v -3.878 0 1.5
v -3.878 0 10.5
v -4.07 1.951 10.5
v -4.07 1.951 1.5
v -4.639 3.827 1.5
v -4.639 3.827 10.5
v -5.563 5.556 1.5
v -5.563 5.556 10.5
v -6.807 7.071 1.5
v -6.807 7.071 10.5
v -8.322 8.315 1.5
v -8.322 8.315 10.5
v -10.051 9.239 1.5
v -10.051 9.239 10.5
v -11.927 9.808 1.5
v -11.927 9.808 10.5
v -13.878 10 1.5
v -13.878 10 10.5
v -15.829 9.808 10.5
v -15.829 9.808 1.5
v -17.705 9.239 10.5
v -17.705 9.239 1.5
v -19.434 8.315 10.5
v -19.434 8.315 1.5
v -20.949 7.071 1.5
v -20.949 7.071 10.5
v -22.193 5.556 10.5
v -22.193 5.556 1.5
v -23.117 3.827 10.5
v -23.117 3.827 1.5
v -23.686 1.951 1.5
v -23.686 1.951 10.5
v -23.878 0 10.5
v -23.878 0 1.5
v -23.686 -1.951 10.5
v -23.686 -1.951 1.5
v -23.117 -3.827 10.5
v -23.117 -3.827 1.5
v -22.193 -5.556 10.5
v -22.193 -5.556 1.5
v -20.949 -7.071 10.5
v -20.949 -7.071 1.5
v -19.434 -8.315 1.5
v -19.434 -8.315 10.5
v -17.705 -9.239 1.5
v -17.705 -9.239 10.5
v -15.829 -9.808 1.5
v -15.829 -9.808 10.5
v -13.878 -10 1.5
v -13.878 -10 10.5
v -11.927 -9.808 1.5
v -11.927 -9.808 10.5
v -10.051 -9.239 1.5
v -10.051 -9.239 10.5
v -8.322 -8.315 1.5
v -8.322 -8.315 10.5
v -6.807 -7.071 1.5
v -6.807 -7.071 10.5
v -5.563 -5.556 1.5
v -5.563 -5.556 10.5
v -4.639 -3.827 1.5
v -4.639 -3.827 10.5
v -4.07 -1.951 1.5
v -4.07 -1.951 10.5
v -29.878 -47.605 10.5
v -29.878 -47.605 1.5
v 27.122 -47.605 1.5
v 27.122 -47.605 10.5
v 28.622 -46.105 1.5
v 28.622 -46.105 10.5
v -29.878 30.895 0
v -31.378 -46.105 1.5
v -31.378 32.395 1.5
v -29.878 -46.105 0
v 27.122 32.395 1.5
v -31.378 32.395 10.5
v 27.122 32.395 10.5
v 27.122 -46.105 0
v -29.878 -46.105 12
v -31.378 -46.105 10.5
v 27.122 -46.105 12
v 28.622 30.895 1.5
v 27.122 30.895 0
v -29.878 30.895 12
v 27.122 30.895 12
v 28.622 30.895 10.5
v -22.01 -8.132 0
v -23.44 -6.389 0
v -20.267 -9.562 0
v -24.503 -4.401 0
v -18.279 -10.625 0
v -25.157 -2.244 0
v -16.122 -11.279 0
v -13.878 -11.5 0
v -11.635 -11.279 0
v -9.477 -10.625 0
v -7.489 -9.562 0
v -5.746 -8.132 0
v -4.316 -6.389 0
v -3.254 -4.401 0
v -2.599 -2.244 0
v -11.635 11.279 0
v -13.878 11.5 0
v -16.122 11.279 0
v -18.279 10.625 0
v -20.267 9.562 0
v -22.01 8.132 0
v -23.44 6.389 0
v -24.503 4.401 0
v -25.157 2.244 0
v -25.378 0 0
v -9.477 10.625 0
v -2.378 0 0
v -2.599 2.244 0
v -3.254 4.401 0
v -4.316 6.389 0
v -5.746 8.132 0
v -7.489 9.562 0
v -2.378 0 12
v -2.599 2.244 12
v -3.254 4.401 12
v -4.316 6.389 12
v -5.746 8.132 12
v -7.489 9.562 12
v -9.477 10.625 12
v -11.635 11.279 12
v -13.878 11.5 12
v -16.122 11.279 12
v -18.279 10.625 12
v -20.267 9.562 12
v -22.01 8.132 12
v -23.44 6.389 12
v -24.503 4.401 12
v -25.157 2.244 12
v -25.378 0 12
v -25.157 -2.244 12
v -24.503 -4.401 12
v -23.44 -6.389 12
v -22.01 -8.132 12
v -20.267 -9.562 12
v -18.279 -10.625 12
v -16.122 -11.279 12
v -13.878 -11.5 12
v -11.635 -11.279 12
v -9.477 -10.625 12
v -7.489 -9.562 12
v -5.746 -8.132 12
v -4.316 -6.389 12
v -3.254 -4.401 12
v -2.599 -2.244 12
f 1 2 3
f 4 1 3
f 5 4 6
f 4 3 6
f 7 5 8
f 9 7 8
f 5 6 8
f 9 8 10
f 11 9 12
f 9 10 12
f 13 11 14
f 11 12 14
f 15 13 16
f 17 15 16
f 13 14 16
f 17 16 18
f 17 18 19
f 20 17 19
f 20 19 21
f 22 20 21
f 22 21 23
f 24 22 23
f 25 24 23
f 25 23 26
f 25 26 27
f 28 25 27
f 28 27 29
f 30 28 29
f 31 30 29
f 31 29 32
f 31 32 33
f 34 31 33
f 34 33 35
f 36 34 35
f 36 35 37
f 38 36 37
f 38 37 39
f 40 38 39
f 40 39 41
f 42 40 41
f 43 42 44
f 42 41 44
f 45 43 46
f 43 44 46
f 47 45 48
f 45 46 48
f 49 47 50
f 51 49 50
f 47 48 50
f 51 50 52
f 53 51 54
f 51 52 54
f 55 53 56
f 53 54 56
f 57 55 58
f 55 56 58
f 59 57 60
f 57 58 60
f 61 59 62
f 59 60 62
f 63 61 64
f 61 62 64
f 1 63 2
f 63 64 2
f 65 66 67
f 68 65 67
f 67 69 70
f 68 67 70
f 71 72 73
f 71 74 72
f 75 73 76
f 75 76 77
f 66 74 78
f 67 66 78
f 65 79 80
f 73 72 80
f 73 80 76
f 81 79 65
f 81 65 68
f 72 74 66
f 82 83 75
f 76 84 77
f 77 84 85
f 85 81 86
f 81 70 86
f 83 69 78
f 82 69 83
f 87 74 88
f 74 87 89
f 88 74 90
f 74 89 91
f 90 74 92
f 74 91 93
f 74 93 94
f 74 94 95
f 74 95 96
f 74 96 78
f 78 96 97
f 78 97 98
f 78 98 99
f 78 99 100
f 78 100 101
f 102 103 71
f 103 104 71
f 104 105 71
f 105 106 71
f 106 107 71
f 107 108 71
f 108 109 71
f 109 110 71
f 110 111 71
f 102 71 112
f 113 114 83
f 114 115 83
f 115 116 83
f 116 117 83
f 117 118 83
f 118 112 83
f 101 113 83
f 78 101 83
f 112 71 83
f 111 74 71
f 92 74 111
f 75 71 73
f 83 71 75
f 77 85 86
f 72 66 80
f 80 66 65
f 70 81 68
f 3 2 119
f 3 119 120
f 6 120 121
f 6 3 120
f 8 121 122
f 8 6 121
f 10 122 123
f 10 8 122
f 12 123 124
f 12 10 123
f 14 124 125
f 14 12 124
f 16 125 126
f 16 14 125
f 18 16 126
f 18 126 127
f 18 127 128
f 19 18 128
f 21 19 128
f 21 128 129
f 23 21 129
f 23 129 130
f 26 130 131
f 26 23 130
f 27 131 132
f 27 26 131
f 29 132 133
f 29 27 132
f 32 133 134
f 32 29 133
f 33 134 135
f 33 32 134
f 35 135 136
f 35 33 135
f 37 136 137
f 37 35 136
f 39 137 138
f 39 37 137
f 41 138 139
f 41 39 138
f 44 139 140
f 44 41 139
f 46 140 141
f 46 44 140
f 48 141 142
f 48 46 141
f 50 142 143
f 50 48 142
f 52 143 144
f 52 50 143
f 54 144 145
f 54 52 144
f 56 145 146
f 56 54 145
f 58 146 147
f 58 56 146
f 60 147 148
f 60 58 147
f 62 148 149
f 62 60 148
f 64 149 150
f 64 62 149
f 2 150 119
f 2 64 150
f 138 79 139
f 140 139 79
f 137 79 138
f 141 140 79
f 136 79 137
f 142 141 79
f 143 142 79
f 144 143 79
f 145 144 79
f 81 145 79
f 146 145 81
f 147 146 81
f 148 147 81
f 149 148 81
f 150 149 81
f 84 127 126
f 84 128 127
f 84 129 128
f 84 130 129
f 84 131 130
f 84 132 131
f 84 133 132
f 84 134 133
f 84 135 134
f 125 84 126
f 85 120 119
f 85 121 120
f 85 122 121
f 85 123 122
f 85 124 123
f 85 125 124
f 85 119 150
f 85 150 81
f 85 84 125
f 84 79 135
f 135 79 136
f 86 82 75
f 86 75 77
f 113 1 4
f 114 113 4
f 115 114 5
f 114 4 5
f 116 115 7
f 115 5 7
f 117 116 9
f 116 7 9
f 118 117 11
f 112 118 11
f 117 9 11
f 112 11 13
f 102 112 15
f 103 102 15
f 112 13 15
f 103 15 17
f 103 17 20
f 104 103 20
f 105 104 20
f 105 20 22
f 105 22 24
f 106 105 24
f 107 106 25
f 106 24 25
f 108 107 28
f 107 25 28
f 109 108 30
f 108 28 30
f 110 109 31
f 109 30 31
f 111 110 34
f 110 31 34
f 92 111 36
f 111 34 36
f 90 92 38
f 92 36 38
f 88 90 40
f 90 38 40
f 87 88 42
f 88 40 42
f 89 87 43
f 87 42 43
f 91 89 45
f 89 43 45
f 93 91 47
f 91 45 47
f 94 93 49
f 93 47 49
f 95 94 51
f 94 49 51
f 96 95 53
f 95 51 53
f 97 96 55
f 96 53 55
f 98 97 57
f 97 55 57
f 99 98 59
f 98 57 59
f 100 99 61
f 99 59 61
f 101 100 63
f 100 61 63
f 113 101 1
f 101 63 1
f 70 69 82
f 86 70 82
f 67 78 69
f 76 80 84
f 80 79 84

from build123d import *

# Parameters (mm, degrees)
F0_W     = 60
F0_H     = 80
F1_DEPTH = 12
F2_R     = 10
F3_DEPTH = 25
F4_SIZE  = 1.5


with BuildPart() as f1:
    # F0 (on Top) → F1 (new body)
    with BuildSketch(Plane.XY):
        with Locations((-1.378186, -7.605234)):
            Rectangle(F0_W, F0_H)
    extrude(amount=F1_DEPTH)

    # F2 (on face) → F3 (cut)
    with BuildSketch(Plane.XY.offset(12)):
        with Locations((-13.878186, 0)):
            Circle(F2_R)
    extrude(amount=-F3_DEPTH, mode=Mode.SUBTRACT)

    # F4
    f4_edges = [f1.edges().sort_by_distance(p)[0] for p in [
        (-23.878186, 0, 12),
        (-31.378186, -7.605234, 12),
        (-1.378186, 32.394766, 12),
        (-1.378186, 32.394766, 0),
        (28.621814, -7.605234, 0),
        (-31.378186, -7.605234, 0),
        (-1.378186, -47.605234, 0),
        (-23.878186, 0, 0),
        (28.621814, -7.605234, 12),
        (-1.378186, -47.605234, 12),
        (28.621814, -47.605234, 6),
        (28.621814, 32.394766, 6),
        (-31.378186, -47.605234, 6),
    ]]
    chamfer(f4_edges, length=F4_SIZE)


solid = f1.part
